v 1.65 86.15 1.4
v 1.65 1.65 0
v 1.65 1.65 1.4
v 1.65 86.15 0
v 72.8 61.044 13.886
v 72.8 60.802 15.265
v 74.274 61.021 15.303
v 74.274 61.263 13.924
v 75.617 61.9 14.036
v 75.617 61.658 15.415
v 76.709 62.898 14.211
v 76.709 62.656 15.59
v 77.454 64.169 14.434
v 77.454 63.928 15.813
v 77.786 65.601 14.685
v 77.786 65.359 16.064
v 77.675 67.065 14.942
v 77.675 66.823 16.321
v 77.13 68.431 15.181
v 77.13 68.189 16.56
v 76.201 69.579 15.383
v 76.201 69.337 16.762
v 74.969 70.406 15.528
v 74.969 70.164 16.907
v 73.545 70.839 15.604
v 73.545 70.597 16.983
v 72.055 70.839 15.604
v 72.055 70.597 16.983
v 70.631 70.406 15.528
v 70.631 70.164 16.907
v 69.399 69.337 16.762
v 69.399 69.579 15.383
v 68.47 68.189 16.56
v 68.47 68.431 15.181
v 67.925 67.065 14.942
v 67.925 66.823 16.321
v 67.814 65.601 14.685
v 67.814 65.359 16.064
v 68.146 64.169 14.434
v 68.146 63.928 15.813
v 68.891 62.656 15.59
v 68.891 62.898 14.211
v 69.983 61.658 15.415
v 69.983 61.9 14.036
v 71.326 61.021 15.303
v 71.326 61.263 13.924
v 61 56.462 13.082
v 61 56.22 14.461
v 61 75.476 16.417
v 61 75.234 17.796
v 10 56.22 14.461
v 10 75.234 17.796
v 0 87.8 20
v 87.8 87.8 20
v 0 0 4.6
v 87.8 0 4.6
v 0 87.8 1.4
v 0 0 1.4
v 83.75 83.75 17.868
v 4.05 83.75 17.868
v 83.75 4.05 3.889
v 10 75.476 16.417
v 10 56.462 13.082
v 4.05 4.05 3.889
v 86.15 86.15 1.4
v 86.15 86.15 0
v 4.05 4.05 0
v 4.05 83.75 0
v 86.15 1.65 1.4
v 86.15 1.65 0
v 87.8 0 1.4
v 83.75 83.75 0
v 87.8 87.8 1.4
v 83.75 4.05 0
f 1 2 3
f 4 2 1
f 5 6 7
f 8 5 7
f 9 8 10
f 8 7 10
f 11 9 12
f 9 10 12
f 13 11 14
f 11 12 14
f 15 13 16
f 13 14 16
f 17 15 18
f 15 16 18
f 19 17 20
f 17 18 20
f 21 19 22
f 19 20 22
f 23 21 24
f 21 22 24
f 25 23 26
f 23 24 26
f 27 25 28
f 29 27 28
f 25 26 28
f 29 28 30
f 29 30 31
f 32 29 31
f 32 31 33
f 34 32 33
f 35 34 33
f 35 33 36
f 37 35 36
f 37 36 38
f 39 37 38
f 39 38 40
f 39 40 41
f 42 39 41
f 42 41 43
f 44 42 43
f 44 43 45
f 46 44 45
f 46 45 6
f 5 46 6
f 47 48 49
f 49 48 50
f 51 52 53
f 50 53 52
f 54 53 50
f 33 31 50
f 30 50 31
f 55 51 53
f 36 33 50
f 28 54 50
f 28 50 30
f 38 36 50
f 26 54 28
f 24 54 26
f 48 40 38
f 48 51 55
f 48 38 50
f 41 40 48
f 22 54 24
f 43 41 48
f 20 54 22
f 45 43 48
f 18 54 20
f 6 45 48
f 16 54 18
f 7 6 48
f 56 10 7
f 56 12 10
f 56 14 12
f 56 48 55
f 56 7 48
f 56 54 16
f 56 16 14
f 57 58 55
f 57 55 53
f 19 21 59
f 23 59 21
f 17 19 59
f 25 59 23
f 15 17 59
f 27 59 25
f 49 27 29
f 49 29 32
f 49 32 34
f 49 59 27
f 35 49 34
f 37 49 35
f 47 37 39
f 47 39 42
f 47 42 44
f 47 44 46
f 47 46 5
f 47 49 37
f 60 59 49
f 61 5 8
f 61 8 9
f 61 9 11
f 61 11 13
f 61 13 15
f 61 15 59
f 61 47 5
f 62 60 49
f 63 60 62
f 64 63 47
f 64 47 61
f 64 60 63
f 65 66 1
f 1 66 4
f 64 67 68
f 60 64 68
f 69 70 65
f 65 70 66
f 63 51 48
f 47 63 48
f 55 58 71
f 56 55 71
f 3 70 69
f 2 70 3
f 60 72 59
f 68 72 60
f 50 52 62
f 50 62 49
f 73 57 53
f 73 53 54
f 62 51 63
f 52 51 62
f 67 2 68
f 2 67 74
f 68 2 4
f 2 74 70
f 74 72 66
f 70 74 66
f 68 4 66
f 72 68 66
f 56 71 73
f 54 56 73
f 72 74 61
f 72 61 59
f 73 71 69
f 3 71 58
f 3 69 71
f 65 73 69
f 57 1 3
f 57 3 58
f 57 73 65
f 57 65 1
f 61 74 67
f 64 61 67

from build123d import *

# Parameters (mm, degrees)
SKETCH1_W           = 87.8
SKETCH1_H           = 87.8
BOSS_EXTRUDE1_DEPTH = 20
SKETCH2_W           = 87.8
SKETCH2_H           = 87.8
SKETCH2_W_2         = 84.5
SKETCH2_H_2         = 84.5
CUT_EXTRUDE1_DEPTH  = 1.4
CUT_EXTRUDE2_DEPTH  = 126.768358501
CUT_EXTRUDE3_REACH  = 127.768
SKETCH4_W           = 79.7
SKETCH4_H           = 79.7
SKETCH5_R           = 5
SKETCH5_W           = 51
SKETCH5_H           = 19.304
CUT_EXTRUDE4_DEPTH  = 126.686719868


with BuildPart() as part:
    # Sketch1 → Boss-Extrude1 (new body)
    with BuildSketch(Plane.XY):
        with Locations((43.9, 43.9)):
            Rectangle(SKETCH1_W, SKETCH1_H)
    extrude(amount=BOSS_EXTRUDE1_DEPTH)

    # Sketch2 → Cut-Extrude1 (cut)
    with BuildSketch(Plane(origin=(0, 0, 0), x_dir=(-1, 0, 0), z_dir=(0, 0, -1))):
        with Locations((-43.9, 43.9)):
            Rectangle(SKETCH2_W, SKETCH2_H)
        with Locations((-43.9, 43.9)):
            Rectangle(SKETCH2_W_2, SKETCH2_H_2, mode=Mode.SUBTRACT)
    extrude(amount=-CUT_EXTRUDE1_DEPTH, mode=Mode.SUBTRACT)

    # Sketch3 → Cut-Extrude2 (cut, through all)
    with BuildSketch(Plane(origin=(87.8, 0, 0), x_dir=(0, 0, -1), z_dir=(1, 0, 0))):
        Polygon((-20, 87.8), (-4.6, 0), (-20, 0), align=None)
    extrude(amount=-CUT_EXTRUDE2_DEPTH, mode=Mode.SUBTRACT)

    # Cut-Extrude3: up to this plane
    cut_extrude3_end = Plane(origin=(0, 88.041865807, 18.621050787), z_dir=(0, 0.17276129088861056, -0.9849637233779227))
    # Sketch4 → Cut-Extrude3 (cut, up to the surface)
    with BuildSketch(Plane(origin=(0, 0, 0), x_dir=(-1, 0, 0), z_dir=(0, 0, -1)), mode=Mode.PRIVATE) as cut_extrude3_sk1:
        with Locations((-43.9, 43.9)):
            Rectangle(SKETCH4_W, SKETCH4_H)
    cut_extrude3_tool1 = split(extrude(cut_extrude3_sk1.sketch, amount=-CUT_EXTRUDE3_REACH, mode=Mode.PRIVATE), bisect_by=cut_extrude3_end, keep=Keep.BOTH, mode=Mode.PRIVATE)
    add(cut_extrude3_tool1.solids().sort_by_distance((43.9, 43.9, 0))[0], mode=Mode.SUBTRACT)

    # Sketch5 → Cut-Extrude4 (cut, through all)
    with BuildSketch(Plane(origin=(0, -0.78275258, 4.462706267), x_dir=(1, 0, 0), z_dir=(0, -0.1727612908886106, 0.9849637233779227))):
        with Locations(Location((72.8, 67.524905437, 0), (0, 0, 270))):
            Circle(SKETCH5_R)
        with Locations((35.5, 67.524905437)):
            Rectangle(SKETCH5_W, SKETCH5_H)
    extrude(amount=-CUT_EXTRUDE4_DEPTH, mode=Mode.SUBTRACT)


solid = part.part
